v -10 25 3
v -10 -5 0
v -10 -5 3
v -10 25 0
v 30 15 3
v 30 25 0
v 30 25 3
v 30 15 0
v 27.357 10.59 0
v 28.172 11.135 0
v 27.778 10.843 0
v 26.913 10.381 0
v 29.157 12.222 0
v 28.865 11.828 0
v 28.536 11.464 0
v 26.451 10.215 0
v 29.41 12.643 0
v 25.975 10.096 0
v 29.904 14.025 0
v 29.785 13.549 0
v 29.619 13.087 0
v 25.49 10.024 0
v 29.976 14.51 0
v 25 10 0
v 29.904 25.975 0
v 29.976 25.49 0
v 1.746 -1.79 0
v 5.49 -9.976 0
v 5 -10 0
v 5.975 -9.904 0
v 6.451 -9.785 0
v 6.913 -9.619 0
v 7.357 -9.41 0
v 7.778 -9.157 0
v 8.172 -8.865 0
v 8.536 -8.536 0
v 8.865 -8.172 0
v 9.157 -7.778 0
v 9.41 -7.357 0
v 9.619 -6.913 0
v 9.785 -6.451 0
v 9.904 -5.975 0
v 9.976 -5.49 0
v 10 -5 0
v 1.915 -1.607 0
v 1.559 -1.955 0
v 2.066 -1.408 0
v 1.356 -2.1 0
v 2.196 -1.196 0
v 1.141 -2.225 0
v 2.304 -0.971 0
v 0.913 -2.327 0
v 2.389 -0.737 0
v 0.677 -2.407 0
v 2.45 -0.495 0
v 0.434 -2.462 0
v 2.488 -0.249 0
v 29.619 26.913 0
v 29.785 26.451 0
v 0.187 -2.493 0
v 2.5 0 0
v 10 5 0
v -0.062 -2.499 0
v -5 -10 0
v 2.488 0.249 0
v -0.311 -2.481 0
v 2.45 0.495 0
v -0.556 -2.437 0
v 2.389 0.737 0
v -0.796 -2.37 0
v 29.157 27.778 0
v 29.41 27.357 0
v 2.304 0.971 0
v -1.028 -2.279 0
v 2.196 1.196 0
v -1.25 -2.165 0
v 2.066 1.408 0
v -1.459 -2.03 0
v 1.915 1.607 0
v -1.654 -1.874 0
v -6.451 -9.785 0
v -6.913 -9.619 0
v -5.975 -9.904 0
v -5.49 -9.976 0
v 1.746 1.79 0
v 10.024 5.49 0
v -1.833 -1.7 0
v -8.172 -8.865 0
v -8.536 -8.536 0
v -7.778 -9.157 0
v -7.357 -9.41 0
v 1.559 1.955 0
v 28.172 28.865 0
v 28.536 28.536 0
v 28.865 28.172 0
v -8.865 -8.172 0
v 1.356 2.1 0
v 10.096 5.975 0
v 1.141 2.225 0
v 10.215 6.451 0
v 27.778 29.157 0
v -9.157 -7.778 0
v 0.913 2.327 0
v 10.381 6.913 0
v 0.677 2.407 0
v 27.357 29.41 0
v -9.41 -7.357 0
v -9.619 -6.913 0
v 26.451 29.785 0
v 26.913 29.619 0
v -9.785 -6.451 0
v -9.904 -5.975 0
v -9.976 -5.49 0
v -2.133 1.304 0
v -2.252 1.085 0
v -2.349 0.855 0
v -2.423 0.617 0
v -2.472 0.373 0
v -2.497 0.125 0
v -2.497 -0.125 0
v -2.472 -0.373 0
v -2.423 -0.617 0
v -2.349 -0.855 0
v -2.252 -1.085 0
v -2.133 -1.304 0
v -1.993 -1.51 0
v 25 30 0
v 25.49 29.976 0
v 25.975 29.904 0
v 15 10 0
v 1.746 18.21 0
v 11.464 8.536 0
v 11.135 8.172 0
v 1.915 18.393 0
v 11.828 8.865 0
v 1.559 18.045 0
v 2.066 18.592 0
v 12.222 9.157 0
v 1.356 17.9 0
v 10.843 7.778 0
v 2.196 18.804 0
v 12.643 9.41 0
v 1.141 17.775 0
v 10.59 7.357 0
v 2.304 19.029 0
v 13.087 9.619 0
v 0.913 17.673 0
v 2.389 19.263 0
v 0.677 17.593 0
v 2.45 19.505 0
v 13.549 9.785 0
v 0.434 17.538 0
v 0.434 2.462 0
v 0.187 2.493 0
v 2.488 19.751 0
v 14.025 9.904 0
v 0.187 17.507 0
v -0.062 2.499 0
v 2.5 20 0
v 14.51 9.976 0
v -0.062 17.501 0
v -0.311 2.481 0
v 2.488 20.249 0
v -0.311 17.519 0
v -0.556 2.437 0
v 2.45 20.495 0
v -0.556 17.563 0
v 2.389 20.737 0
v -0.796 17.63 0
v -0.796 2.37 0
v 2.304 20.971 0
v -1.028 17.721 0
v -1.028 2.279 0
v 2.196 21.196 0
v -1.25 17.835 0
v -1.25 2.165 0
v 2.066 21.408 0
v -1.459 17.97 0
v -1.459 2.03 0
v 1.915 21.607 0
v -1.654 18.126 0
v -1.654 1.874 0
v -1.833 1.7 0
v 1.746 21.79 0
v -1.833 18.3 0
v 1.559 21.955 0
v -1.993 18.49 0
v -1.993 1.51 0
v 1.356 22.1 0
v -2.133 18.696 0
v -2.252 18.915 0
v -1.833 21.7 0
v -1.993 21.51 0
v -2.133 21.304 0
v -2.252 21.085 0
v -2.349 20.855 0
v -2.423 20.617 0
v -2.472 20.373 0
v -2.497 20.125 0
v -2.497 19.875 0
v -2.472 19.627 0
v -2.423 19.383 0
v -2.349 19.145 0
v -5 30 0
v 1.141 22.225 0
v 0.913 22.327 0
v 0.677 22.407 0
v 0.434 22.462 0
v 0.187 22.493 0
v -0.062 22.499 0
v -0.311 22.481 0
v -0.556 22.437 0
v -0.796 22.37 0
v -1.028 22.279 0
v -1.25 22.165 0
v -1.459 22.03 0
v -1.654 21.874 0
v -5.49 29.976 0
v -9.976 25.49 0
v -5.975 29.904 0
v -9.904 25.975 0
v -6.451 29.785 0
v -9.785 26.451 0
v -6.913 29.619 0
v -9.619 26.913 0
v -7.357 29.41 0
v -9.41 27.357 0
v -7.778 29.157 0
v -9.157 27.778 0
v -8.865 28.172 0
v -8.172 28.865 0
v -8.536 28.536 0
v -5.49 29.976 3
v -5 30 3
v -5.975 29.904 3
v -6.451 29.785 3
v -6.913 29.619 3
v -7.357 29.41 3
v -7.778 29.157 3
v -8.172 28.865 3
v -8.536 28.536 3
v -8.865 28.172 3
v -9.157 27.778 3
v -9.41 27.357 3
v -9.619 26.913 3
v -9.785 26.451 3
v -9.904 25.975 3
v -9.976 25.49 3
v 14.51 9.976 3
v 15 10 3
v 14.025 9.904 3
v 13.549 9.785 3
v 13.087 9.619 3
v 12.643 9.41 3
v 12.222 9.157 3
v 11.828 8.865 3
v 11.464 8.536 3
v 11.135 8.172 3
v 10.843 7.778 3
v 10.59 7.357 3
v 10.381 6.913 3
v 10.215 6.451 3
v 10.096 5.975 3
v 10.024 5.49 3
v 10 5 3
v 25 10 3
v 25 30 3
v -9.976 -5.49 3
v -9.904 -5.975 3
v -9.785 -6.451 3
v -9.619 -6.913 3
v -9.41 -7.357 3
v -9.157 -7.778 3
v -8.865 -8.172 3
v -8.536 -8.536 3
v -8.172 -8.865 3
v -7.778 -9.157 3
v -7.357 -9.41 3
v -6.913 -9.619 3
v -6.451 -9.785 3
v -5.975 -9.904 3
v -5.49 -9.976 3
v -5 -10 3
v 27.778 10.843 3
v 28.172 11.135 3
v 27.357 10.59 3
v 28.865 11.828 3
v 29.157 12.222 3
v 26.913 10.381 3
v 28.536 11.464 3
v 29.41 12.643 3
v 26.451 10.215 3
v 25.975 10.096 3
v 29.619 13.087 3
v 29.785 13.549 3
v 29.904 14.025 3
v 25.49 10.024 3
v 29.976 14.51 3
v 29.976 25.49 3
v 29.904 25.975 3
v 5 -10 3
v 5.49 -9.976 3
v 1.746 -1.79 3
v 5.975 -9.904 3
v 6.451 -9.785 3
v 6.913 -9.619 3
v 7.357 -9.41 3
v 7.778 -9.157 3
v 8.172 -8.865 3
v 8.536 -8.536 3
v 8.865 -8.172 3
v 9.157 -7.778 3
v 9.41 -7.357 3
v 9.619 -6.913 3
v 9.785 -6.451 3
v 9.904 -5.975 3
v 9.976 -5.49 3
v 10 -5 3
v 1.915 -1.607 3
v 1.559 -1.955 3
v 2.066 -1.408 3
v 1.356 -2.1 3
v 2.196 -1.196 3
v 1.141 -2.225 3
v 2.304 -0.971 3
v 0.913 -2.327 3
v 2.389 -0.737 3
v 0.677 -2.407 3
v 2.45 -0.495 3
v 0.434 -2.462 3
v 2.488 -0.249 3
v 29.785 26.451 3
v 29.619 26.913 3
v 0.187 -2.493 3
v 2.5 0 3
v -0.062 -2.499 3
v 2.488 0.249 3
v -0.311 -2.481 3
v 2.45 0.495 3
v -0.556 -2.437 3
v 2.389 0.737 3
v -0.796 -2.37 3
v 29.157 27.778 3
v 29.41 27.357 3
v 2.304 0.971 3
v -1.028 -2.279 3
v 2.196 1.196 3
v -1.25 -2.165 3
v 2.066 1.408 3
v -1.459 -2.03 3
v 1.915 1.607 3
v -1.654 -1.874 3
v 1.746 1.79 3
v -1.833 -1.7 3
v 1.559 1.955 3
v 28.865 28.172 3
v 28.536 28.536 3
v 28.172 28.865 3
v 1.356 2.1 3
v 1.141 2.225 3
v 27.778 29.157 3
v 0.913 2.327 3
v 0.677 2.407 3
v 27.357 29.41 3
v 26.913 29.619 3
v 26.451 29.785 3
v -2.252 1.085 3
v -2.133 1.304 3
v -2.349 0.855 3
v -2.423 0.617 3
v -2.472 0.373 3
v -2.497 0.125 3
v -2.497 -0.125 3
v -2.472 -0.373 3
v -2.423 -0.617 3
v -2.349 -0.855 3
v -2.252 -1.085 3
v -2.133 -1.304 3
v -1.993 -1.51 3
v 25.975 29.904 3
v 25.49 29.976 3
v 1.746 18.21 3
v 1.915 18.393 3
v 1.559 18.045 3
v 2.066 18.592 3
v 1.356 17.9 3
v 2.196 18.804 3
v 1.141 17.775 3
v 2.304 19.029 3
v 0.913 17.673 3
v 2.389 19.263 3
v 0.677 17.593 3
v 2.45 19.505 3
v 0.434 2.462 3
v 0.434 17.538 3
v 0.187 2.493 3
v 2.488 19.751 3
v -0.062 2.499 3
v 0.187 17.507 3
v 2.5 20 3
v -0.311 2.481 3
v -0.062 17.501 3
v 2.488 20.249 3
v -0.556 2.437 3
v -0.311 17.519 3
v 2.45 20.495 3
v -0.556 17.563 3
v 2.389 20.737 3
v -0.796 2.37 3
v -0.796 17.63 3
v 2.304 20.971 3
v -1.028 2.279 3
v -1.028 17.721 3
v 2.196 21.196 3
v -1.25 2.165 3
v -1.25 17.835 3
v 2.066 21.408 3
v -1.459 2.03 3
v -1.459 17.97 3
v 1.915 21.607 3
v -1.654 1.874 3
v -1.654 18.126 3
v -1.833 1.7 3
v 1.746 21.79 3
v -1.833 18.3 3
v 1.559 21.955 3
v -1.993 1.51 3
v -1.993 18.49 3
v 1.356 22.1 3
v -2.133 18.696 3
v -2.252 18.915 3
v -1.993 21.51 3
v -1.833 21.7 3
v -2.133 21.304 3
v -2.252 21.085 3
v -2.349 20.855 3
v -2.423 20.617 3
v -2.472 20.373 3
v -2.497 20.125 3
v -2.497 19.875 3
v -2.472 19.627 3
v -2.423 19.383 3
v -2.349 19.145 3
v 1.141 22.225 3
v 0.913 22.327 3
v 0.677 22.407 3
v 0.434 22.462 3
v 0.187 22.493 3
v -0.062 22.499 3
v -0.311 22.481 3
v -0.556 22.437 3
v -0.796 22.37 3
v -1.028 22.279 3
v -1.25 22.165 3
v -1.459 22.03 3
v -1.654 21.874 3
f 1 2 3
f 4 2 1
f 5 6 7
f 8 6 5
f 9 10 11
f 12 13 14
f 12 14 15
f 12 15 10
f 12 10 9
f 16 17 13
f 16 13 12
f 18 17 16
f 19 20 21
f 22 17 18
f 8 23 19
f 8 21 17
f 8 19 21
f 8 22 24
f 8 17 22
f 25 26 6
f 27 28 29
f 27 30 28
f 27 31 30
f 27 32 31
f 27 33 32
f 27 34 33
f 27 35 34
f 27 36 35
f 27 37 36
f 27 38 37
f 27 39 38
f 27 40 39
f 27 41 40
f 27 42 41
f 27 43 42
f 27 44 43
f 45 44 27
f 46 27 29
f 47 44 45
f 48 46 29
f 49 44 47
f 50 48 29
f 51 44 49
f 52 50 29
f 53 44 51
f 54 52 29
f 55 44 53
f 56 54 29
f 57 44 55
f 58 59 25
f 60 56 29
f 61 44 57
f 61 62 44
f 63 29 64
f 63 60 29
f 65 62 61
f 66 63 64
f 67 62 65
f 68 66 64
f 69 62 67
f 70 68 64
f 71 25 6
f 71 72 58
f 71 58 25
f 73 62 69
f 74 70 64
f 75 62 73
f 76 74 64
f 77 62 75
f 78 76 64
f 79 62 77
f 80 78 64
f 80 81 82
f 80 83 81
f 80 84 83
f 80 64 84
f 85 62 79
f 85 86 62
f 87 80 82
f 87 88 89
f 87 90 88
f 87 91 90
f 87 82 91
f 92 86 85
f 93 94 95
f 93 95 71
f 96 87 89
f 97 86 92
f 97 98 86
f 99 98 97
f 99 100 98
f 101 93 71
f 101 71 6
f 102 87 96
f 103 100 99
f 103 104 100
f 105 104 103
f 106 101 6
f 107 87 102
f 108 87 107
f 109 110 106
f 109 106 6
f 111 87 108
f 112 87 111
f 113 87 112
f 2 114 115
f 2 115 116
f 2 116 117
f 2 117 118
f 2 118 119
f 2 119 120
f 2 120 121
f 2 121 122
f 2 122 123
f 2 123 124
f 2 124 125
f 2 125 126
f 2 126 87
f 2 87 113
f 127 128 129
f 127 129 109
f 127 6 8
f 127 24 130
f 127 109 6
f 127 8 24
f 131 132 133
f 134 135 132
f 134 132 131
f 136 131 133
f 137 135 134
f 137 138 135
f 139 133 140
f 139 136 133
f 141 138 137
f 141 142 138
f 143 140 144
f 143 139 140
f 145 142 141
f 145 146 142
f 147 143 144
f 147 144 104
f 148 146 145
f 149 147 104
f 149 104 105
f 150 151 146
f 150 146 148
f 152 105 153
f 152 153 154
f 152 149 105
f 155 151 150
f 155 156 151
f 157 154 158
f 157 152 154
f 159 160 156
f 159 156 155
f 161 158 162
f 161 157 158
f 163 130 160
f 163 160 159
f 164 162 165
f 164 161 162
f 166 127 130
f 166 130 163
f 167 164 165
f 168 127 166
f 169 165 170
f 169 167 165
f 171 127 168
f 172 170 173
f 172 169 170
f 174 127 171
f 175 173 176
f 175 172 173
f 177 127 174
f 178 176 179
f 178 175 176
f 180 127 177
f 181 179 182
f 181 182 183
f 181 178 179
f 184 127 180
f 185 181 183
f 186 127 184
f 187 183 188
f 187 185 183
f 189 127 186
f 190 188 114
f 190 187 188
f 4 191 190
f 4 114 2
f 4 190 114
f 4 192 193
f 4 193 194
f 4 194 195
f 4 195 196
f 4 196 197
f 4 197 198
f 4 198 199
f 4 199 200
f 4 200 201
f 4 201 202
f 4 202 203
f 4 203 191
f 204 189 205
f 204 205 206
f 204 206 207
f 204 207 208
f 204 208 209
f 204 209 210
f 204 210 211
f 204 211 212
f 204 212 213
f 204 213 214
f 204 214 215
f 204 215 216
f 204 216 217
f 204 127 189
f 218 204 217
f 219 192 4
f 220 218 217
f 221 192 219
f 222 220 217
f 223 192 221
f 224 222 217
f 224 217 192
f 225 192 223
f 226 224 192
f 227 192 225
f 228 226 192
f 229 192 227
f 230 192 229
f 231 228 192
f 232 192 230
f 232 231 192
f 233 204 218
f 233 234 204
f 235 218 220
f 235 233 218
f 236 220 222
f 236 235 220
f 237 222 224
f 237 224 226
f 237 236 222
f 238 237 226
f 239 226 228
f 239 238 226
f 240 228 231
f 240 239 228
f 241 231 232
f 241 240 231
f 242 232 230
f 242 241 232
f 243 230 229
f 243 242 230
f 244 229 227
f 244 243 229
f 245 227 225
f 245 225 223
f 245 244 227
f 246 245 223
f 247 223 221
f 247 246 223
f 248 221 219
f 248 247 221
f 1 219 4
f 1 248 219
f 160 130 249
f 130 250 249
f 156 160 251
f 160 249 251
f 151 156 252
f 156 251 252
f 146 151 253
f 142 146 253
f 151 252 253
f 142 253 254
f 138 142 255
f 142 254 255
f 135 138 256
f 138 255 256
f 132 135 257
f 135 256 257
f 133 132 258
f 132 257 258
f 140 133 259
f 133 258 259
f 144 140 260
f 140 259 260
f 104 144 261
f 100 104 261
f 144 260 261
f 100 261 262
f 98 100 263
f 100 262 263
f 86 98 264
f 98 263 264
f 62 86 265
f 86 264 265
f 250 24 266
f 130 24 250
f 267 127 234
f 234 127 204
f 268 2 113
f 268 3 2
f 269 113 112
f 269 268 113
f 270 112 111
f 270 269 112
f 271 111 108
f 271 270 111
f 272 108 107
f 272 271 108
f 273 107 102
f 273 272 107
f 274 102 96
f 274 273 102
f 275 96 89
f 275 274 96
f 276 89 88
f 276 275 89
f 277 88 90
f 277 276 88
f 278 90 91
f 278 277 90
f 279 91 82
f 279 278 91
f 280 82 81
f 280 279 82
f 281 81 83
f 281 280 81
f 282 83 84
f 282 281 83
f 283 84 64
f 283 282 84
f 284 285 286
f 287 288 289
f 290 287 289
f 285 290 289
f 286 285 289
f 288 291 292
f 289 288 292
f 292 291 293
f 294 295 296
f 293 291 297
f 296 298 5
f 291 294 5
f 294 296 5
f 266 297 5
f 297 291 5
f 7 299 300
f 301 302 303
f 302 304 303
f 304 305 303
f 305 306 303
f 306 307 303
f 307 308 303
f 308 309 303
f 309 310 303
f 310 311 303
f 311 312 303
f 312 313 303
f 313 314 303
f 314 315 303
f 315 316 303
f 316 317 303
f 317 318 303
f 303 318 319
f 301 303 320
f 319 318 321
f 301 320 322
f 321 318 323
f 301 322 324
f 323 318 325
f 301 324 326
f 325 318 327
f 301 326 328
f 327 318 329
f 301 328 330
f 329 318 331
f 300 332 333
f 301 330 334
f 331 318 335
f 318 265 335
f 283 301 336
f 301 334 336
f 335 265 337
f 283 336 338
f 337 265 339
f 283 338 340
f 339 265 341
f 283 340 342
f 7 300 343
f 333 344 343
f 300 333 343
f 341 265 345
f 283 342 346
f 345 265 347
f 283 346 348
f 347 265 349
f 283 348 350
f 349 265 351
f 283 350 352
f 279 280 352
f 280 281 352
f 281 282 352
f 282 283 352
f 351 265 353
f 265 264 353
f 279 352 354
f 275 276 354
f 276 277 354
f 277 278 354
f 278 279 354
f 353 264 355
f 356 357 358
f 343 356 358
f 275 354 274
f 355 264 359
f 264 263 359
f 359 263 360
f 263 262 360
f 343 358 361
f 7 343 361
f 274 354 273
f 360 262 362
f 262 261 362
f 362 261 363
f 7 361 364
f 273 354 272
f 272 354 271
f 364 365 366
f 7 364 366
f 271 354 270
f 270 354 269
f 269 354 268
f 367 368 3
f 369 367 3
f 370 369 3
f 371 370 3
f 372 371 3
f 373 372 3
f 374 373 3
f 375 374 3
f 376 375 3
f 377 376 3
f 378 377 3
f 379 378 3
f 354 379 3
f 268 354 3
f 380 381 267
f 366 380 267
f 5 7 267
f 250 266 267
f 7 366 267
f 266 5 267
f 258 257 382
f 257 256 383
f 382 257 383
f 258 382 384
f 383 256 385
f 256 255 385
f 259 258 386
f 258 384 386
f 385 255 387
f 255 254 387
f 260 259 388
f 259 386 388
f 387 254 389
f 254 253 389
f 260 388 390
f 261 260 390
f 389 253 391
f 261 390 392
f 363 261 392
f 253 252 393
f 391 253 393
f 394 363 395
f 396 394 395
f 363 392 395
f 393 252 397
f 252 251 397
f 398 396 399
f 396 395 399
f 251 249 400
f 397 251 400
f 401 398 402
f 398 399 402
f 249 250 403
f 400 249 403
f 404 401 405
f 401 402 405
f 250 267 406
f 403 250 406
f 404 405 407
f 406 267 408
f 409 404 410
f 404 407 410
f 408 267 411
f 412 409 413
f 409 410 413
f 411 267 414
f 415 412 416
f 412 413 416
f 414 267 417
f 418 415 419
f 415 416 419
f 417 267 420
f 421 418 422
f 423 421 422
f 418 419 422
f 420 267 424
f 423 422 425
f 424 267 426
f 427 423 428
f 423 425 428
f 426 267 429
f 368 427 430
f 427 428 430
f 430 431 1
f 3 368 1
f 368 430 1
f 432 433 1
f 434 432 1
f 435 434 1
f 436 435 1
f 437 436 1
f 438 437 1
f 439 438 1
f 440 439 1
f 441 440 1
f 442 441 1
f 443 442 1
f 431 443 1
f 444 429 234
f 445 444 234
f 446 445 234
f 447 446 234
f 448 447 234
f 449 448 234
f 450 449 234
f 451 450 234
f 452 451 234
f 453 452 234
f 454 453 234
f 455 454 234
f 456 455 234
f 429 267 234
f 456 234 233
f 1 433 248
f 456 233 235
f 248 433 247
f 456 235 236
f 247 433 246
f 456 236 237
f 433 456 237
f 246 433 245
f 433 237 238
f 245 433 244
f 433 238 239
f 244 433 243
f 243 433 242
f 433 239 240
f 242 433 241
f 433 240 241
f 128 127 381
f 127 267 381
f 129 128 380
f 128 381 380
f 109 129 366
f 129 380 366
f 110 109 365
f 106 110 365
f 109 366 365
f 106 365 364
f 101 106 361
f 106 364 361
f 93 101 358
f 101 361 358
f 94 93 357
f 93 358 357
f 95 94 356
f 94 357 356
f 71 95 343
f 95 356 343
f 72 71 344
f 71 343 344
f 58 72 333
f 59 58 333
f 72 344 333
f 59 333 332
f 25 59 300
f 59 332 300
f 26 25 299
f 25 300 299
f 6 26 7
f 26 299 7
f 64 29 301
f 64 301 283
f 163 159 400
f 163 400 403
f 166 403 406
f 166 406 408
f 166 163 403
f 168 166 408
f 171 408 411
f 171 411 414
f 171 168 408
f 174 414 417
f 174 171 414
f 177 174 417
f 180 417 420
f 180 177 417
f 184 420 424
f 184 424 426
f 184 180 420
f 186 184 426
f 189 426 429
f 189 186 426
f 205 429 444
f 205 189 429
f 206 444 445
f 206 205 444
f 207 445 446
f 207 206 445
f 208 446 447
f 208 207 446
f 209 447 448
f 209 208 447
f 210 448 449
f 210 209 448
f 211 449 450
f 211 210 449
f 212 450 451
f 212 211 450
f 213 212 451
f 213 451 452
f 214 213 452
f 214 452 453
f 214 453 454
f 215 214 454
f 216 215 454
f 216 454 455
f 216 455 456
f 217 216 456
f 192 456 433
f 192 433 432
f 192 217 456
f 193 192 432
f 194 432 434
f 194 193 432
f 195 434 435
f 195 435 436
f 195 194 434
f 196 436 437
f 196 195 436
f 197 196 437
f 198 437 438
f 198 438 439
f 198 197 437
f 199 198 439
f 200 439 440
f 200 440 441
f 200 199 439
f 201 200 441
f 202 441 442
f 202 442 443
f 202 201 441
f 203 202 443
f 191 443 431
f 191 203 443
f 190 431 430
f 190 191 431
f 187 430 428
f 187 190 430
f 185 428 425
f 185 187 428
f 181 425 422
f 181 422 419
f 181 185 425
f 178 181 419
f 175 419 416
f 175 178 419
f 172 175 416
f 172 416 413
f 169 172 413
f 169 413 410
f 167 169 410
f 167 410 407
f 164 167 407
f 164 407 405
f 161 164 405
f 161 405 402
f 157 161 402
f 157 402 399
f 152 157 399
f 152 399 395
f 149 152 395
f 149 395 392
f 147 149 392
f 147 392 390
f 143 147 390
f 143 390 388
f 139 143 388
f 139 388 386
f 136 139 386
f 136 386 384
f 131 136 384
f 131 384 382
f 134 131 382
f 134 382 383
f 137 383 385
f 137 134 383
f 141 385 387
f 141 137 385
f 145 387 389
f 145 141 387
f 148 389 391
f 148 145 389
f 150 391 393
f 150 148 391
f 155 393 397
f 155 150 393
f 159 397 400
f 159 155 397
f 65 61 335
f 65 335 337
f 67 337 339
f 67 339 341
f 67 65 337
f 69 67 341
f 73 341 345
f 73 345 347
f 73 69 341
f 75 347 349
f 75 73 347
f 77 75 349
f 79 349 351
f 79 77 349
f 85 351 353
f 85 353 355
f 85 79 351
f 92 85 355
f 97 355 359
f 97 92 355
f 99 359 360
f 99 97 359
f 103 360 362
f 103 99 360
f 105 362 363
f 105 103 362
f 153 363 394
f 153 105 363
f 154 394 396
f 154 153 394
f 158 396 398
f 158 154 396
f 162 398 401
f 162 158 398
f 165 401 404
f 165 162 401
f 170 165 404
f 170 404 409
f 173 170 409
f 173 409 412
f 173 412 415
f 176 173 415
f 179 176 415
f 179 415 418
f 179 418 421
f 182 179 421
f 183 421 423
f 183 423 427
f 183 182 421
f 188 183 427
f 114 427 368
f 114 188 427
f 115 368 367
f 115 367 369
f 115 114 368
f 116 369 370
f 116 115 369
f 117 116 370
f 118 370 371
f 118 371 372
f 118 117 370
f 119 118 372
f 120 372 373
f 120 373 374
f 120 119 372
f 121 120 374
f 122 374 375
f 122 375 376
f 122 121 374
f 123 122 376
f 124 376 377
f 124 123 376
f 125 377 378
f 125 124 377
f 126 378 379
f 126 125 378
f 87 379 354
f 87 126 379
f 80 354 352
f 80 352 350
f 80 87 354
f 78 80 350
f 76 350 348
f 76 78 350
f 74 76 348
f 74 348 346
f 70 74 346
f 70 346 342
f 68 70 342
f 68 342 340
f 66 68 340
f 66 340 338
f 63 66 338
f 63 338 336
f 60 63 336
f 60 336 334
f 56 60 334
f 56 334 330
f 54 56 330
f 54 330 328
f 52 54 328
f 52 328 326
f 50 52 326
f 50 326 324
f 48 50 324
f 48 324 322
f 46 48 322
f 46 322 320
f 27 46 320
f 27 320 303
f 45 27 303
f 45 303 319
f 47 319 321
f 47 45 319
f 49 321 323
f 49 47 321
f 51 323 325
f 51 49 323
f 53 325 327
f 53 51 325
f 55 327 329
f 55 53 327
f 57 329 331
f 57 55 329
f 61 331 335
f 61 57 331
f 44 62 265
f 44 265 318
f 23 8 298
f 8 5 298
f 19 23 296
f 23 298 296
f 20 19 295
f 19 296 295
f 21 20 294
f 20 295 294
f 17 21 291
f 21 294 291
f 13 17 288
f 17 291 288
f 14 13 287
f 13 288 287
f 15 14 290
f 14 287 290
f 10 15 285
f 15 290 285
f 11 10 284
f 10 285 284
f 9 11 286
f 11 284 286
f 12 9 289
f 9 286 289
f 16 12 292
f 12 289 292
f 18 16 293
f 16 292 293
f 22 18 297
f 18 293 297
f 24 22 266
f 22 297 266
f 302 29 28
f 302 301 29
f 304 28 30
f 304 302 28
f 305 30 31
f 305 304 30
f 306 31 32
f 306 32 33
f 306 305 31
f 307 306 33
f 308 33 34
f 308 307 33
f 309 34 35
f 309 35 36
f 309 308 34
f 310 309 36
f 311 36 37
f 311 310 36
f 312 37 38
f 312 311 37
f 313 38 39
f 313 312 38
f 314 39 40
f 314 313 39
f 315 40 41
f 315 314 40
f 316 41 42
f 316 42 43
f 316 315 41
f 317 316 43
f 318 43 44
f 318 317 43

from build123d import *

# Parameters (mm, degrees)
SKETCH_2_R      = 2.5
EXTRUDE_1_DEPTH = 3
FILLET_1_R      = 5


with BuildPart() as part:
    # ｽｹｯﾁ2 → ﾎﾞｽ - 押し出し1 (new body)
    with BuildSketch(Plane.XY):
        Polygon((10, 30), (30, 30), (30, 10), (10, 10), (10, -10), (-10, -10), (-10, 30), align=None)
        Circle(SKETCH_2_R, mode=Mode.SUBTRACT)
        with Locations((0, 20)):
            Circle(SKETCH_2_R, mode=Mode.SUBTRACT)
    extrude(amount=EXTRUDE_1_DEPTH)

    # ﾌｨﾚｯﾄ1
    fillet_1_edges = [part.edges().sort_by_distance(p)[0] for p in [
        (-10, 30, 1.5),
        (30, 30, 1.5),
        (30, 10, 1.5),
        (10, 10, 1.5),
        (10, -10, 1.5),
        (-10, -10, 1.5),
    ]]
    fillet(fillet_1_edges, radius=FILLET_1_R)


solid = part.part
